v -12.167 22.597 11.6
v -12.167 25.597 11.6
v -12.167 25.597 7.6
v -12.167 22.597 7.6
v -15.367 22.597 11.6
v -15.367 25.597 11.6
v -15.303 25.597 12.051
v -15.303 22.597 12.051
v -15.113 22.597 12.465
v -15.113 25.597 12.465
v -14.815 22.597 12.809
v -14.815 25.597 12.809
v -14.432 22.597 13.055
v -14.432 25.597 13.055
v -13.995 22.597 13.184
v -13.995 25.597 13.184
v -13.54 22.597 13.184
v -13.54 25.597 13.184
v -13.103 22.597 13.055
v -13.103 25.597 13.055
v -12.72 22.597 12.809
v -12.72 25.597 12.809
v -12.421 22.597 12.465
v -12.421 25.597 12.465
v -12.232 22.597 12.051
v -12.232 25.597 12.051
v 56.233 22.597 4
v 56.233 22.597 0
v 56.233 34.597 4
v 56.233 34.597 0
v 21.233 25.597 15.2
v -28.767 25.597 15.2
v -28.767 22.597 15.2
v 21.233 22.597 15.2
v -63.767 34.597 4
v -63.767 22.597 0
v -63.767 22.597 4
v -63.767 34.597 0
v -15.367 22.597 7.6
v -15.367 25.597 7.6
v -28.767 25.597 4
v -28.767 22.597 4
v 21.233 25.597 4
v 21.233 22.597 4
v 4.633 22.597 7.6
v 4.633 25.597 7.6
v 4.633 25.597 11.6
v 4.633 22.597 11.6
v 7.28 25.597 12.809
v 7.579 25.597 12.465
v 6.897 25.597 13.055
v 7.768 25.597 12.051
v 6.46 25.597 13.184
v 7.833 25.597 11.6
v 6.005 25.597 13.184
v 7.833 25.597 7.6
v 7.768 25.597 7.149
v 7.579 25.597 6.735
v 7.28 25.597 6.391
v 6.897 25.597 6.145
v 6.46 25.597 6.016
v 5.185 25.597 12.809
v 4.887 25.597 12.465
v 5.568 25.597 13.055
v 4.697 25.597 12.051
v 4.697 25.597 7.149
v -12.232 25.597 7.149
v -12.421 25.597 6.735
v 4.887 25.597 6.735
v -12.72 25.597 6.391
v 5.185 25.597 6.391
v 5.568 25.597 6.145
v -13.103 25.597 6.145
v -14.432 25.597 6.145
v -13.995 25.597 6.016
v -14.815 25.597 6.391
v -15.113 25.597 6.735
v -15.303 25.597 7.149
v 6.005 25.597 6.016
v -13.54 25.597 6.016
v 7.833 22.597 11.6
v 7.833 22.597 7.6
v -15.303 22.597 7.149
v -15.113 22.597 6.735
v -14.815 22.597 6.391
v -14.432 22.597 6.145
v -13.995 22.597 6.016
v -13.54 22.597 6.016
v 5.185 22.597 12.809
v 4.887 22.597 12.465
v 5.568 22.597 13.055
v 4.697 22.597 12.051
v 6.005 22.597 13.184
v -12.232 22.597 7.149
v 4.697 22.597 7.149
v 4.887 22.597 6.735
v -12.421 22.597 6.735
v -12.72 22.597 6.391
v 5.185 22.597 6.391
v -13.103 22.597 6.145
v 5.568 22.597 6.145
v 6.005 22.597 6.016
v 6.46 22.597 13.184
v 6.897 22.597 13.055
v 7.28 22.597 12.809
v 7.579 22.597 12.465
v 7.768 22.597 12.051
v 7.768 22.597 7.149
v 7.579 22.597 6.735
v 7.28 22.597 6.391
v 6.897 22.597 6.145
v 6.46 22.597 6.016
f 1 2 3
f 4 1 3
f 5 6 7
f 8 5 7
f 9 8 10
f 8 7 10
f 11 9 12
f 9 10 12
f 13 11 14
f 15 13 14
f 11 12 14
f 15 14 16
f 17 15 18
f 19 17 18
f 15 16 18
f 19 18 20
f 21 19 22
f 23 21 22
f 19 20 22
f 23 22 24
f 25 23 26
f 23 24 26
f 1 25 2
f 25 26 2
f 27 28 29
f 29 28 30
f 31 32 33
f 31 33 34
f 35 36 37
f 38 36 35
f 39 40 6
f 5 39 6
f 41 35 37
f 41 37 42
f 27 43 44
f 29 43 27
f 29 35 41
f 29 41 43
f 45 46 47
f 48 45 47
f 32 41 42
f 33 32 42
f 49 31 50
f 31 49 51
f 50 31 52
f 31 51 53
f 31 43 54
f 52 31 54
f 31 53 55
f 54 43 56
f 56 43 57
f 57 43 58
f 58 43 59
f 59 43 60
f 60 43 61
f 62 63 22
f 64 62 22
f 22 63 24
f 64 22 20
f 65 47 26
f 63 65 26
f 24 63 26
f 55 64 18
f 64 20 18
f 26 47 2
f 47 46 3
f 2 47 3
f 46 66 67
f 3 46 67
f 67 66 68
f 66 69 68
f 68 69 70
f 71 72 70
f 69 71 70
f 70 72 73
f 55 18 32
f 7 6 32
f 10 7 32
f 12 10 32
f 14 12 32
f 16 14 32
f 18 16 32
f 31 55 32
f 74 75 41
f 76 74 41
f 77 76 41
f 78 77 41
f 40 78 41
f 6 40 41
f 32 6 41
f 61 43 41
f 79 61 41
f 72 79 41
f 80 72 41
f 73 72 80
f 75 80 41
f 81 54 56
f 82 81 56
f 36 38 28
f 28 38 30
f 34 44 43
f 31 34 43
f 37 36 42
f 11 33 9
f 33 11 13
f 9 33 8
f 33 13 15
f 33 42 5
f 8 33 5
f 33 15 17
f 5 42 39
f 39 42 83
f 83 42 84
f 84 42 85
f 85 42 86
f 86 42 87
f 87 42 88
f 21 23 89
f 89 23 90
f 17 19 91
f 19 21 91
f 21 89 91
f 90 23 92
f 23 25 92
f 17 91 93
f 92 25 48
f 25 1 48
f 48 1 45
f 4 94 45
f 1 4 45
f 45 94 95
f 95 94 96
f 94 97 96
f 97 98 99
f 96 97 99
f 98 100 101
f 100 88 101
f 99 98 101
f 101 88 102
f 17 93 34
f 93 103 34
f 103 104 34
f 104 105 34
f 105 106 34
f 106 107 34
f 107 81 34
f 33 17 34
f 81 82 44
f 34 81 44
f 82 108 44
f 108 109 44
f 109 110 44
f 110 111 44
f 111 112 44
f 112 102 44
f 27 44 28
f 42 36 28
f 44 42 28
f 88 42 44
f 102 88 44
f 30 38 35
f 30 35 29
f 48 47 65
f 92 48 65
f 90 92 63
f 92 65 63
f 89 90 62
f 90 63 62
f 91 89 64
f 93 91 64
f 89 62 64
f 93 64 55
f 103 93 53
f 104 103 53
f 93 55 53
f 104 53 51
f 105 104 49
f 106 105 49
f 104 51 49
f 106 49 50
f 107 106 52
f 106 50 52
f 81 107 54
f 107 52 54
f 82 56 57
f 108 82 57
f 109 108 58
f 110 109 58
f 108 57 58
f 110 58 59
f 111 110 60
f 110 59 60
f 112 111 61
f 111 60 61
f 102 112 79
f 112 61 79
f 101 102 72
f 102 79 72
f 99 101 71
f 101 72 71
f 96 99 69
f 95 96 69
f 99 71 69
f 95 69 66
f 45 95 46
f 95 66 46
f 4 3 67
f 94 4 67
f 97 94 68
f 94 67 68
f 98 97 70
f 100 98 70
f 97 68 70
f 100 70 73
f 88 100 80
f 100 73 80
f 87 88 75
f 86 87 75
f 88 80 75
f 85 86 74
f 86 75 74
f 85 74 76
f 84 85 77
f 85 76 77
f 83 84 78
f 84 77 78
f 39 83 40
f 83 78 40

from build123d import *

# Parameters (mm, degrees)
SKETCH1_W           = 120
SKETCH1_H           = 12
BOSS_EXTRUDE1_DEPTH = 4
BOSS_EXTRUDE2_DEPTH = 11.2
CUT_EXTRUDE1_DEPTH  = 3


with BuildPart() as part:
    # Sketch1 → Boss-Extrude1 (new body)
    with BuildSketch(Plane.XY):
        with Locations((-3.767369491, 28.596547675)):
            Rectangle(SKETCH1_W, SKETCH1_H)
    extrude(amount=BOSS_EXTRUDE1_DEPTH)

    # Sketch2 → Boss-Extrude2 (add)
    with BuildSketch(Plane.XY.offset(4)):
        Polygon((-3.767369491, 22.596547675), (21.232630509, 22.596547675), (21.232630509, 25.596547675), (-28.767369491, 25.596547675), (-28.767369491, 22.596547675), align=None)
    extrude(amount=BOSS_EXTRUDE2_DEPTH)

    # Sketch3 → Cut-Extrude1 (cut)
    with BuildSketch(Plane(origin=(0, 25.596547675, 0), x_dir=(1, 0, 0), z_dir=(0, 1, 0))):
        with BuildLine():
            Line((7.832630509, -11.6), (7.832630509, -7.6))
            ThreePointArc((7.832630509, -7.6), (6.232630509, -6), (4.632630509, -7.6))
            Line((4.632630509, -7.6), (4.632630509, -11.6))
            ThreePointArc((4.632630509, -11.6), (6.232630509, -13.2), (7.832630509, -11.6))
        make_face()
        with BuildLine():
            Line((-15.367369491, -7.6), (-15.367369491, -11.6))
            ThreePointArc((-15.367369491, -11.6), (-13.767369491, -13.2), (-12.167369491, -11.6))
            Line((-12.167369491, -11.6), (-12.167369491, -7.6))
            ThreePointArc((-12.167369491, -7.6), (-13.767369491, -6), (-15.367369491, -7.6))
        make_face()
    extrude(amount=-CUT_EXTRUDE1_DEPTH, mode=Mode.SUBTRACT)


solid = part.part
